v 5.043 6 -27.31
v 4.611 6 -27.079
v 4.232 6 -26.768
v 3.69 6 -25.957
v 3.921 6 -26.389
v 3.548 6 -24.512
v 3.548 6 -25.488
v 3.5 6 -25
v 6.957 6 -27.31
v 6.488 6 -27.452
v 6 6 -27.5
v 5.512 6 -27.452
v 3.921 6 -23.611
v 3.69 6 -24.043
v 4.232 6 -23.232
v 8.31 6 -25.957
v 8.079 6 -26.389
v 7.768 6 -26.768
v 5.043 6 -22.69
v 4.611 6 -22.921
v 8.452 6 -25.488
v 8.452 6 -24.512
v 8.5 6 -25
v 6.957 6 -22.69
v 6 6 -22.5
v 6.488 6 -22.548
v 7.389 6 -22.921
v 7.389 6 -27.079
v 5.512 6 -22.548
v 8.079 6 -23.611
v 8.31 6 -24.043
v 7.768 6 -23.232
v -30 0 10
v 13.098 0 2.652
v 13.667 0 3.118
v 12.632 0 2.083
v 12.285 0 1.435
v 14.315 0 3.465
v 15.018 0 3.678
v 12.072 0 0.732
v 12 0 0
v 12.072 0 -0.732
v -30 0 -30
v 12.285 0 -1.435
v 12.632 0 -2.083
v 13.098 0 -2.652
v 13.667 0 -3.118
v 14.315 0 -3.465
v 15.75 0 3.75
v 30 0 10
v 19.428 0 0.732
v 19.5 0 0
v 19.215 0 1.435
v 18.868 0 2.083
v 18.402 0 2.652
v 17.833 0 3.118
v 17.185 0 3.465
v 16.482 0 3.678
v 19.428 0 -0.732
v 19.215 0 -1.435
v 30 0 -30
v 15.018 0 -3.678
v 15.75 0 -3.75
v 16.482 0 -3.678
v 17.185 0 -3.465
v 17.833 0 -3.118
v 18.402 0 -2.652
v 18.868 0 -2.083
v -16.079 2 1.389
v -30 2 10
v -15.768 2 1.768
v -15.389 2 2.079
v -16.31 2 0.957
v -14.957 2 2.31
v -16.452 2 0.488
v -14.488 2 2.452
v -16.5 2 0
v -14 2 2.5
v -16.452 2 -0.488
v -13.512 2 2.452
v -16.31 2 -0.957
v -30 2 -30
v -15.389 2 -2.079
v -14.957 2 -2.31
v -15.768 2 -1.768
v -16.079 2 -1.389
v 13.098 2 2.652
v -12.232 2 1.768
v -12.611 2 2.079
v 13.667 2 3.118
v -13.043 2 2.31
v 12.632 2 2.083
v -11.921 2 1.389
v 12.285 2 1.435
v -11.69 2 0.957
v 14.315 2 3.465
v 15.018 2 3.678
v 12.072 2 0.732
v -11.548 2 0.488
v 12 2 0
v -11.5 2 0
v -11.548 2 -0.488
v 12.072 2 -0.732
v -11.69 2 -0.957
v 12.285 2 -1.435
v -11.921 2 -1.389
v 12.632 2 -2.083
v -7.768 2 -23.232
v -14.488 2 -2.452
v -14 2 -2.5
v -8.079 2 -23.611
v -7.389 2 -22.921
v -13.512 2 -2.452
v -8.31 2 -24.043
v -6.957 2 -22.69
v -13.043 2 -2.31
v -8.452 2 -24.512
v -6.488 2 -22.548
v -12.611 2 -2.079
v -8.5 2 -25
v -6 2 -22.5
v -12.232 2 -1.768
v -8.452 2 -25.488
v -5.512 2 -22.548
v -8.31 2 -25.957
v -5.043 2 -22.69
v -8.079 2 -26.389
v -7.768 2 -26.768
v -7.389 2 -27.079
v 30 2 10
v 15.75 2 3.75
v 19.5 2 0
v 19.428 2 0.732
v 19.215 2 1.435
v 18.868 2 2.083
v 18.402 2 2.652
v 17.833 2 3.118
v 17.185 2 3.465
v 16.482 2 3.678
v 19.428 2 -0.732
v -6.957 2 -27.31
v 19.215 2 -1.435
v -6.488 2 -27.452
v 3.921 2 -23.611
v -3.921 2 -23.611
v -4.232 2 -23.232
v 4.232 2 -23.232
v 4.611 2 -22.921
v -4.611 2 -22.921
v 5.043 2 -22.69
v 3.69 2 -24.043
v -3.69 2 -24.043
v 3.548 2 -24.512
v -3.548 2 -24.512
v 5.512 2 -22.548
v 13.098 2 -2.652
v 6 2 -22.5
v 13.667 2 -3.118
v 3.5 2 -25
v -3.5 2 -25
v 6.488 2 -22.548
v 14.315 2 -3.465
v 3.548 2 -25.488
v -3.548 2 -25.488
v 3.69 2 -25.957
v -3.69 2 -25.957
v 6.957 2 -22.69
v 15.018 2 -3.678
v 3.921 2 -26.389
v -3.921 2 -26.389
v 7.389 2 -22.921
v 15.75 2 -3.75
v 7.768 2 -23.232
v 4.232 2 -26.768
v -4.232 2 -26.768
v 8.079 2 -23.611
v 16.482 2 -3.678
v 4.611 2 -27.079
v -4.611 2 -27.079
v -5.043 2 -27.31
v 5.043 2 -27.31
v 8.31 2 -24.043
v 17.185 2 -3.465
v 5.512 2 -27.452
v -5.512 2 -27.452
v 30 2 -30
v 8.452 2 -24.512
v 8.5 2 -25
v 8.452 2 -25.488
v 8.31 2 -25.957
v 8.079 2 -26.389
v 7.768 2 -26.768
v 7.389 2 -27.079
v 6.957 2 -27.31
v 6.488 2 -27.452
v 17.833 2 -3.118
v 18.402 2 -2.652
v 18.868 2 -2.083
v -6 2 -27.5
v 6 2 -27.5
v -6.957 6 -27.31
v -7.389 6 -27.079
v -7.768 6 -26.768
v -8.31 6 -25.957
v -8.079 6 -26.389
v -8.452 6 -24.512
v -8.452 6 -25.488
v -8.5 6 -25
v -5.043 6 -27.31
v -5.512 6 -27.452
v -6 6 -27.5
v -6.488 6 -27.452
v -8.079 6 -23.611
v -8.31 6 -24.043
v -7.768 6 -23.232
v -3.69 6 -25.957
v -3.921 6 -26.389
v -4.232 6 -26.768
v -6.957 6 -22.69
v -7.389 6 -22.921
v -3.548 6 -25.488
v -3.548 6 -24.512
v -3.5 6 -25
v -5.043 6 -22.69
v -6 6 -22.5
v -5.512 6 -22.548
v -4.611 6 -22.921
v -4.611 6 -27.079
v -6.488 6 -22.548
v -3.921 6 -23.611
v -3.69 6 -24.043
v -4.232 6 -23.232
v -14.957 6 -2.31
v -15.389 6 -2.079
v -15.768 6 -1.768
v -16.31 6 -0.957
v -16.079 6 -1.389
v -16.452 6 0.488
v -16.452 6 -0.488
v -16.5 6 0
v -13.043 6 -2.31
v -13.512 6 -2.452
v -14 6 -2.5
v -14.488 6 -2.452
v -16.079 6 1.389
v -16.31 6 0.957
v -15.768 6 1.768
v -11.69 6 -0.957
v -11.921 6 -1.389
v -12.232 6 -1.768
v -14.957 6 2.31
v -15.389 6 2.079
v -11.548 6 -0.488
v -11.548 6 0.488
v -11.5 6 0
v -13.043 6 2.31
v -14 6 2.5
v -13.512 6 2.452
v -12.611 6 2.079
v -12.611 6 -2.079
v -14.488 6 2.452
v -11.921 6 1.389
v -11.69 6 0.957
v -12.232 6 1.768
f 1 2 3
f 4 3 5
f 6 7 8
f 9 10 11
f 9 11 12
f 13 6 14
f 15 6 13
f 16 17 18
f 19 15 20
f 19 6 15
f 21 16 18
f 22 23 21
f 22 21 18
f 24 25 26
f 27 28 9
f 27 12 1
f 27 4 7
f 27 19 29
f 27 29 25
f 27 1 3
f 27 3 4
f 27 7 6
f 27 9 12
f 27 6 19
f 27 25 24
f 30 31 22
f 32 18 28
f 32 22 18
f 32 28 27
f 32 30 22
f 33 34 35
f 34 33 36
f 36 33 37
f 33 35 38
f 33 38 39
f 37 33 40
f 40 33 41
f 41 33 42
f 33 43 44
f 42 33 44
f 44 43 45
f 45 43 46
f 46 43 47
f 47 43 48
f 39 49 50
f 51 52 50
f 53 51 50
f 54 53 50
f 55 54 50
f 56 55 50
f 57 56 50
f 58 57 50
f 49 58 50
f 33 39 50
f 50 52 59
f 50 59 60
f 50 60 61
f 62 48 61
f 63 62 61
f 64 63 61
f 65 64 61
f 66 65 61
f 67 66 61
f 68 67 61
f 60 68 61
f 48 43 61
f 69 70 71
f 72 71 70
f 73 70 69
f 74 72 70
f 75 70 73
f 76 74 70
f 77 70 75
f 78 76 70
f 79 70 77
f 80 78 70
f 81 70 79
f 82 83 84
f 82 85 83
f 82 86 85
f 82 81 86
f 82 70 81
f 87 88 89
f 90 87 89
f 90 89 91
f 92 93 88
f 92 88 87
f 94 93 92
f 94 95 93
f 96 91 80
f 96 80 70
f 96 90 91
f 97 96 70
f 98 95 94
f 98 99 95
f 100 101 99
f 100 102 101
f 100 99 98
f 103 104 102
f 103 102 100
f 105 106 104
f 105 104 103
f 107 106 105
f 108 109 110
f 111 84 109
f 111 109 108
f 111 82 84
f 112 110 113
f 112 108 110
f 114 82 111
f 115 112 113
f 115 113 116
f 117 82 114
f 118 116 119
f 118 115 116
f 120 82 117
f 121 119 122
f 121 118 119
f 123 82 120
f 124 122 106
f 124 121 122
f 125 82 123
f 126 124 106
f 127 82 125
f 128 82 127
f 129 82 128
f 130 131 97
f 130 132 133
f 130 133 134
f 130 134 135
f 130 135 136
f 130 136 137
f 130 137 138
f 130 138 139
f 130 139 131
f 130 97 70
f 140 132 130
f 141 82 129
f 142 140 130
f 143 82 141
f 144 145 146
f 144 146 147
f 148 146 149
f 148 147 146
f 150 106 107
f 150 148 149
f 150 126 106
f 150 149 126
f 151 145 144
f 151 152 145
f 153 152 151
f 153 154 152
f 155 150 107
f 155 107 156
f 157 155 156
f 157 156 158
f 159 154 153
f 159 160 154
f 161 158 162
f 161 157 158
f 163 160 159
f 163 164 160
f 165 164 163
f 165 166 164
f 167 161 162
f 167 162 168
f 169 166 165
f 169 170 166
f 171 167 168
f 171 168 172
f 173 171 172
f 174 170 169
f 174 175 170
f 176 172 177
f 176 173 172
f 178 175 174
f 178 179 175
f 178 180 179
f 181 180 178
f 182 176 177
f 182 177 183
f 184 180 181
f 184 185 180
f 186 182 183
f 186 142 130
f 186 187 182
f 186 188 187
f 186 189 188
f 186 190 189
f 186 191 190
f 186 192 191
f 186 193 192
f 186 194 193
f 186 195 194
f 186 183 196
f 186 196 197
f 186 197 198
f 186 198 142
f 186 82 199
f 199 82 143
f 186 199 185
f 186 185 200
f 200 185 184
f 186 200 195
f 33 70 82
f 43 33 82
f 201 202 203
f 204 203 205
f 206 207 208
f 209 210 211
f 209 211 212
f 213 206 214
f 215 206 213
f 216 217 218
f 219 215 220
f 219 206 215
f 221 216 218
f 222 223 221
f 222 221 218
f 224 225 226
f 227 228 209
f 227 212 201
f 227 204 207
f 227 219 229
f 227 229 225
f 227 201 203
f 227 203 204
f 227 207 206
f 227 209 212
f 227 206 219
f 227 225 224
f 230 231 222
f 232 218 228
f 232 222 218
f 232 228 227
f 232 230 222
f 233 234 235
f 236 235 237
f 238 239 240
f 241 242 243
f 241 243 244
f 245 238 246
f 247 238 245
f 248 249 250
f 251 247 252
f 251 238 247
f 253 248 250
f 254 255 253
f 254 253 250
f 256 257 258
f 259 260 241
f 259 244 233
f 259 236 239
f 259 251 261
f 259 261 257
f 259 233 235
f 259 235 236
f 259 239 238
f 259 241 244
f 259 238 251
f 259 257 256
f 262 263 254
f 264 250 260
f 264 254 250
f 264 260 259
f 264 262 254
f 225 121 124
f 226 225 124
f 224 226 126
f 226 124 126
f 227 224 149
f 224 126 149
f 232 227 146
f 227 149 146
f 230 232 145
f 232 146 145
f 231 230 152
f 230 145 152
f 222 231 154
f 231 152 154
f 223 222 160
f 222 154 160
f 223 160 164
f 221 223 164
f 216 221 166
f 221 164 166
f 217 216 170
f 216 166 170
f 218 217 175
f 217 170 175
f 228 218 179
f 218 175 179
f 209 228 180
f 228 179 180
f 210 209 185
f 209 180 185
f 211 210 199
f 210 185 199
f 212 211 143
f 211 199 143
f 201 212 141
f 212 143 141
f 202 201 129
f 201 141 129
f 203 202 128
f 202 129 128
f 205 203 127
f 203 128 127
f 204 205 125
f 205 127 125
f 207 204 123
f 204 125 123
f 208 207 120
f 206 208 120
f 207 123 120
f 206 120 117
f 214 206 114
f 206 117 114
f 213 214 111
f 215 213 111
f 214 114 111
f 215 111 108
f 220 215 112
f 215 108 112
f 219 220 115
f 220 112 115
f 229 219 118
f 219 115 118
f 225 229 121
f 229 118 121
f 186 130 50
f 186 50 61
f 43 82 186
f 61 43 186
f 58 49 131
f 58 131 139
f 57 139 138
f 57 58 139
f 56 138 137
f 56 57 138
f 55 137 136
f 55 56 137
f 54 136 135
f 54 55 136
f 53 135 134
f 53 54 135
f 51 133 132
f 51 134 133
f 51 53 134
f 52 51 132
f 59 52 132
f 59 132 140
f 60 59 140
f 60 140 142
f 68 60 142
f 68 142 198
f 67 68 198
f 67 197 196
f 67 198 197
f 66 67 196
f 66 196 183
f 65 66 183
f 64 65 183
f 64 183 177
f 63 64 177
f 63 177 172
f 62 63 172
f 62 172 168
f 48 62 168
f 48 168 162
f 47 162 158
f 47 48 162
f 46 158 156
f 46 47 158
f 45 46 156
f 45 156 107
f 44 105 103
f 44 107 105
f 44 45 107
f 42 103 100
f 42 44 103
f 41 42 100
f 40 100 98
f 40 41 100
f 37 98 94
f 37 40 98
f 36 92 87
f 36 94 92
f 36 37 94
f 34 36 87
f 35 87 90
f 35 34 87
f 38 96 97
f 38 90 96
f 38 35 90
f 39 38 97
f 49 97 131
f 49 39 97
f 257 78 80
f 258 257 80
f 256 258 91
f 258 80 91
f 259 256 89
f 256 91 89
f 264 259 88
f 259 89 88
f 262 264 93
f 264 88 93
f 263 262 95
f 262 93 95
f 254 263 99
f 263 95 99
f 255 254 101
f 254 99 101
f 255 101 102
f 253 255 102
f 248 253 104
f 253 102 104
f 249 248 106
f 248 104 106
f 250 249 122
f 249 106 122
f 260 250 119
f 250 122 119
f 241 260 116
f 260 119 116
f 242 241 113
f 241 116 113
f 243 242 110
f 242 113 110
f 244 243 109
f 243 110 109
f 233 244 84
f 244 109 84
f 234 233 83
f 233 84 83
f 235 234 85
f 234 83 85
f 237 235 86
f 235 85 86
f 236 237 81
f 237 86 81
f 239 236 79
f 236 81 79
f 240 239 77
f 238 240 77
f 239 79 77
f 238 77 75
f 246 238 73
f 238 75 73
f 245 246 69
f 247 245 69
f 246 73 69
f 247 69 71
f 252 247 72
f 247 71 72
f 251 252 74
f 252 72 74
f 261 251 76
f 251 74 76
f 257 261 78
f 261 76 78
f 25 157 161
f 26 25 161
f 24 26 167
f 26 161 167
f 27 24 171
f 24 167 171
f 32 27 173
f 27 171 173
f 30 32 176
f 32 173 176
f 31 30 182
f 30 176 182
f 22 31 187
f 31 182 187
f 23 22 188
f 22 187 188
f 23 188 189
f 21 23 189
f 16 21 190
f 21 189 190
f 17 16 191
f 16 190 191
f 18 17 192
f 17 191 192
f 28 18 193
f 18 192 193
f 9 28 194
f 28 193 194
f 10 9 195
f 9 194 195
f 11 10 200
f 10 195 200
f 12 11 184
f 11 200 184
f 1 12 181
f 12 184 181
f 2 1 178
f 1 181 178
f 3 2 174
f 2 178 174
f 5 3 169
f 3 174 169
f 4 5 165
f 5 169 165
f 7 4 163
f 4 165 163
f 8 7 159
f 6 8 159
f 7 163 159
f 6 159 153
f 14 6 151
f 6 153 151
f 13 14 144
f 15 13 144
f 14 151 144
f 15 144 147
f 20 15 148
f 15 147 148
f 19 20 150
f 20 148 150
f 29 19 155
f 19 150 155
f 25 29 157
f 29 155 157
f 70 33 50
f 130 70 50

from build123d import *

# Parameters (mm, degrees)
SKETCH1_W               = 60
SKETCH1_H               = 20
BOSS_EXTRUDE1_DEPTH     = 2
SKETCH2_R               = 2.5
BOSS_EXTRUDE2_DEPTH     = 4
SKETCH3_R               = 1
BOSS_EXTRUDE3_DEPTH     = 4
CUT_EXTRUDE1_DEPTH      = 10
CUT_EXTRUDE1_DEPTH_BACK = 10
SKETCH4_R               = 3.75
SKETCH5_W               = 60
SKETCH5_H               = 20
BOSS_EXTRUDE4_DEPTH     = 2
SKETCH6_R               = 2.5
BOSS_EXTRUDE5_DEPTH     = 4


with BuildPart() as part:
    # Sketch1 → Boss-Extrude1 (new body)
    with BuildSketch(Plane(origin=(0, 0, 0), x_dir=(1, 0, 0), z_dir=(0, 1, 0))):
        Rectangle(SKETCH1_W, SKETCH1_H)
    extrude(amount=BOSS_EXTRUDE1_DEPTH)

    # Sketch2 → Boss-Extrude2 (add)
    with BuildSketch(Plane(origin=(0, 2, 0), x_dir=(1, 0, 0), z_dir=(0, 1, 0))):
        with Locations(Location((-14, 0, 0), (0, 0, 270))):
            Circle(SKETCH2_R)
    extrude(amount=BOSS_EXTRUDE2_DEPTH)

    # Sketch3 → Boss-Extrude3 (add)
    with BuildSketch(Plane(origin=(0, 2, 0), x_dir=(1, 0, 0), z_dir=(0, 1, 0))):
        with Locations(Location((15.75, 0, 0), (0, 0, 270))):
            Circle(SKETCH3_R)
    extrude(amount=BOSS_EXTRUDE3_DEPTH)

    # Sketch4 → Cut-Extrude1 (cut, two sides: drawn at the far end of the back side and taken through both)
    with BuildSketch(Plane(origin=(0, 2, 0), x_dir=(1, 0, 0), z_dir=(0, 1, 0)).offset(-CUT_EXTRUDE1_DEPTH_BACK)):
        with Locations(Location((15.75, 0, 0), (0, 0, 270))):
            Circle(SKETCH4_R)
    extrude(amount=CUT_EXTRUDE1_DEPTH + CUT_EXTRUDE1_DEPTH_BACK, mode=Mode.SUBTRACT)

    # Sketch5 → Boss-Extrude4 (add)
    with BuildSketch(Plane(origin=(0, 2, 0), x_dir=(1, 0, 0), z_dir=(0, 1, 0))):
        with Locations((0, 20)):
            Rectangle(SKETCH5_W, SKETCH5_H)
    extrude(amount=-BOSS_EXTRUDE4_DEPTH)

    # Sketch6 → Boss-Extrude5 (add)
    with BuildSketch(Plane(origin=(0, 2, 0), x_dir=(1, 0, 0), z_dir=(0, 1, 0))):
        with Locations(Location((-6, 25, 0), (0, 0, 270))):
            Circle(SKETCH6_R)
        with Locations(Location((6, 25, 0), (0, 0, 270))):
            Circle(SKETCH6_R)
    extrude(amount=BOSS_EXTRUDE5_DEPTH)


solid = part.part
